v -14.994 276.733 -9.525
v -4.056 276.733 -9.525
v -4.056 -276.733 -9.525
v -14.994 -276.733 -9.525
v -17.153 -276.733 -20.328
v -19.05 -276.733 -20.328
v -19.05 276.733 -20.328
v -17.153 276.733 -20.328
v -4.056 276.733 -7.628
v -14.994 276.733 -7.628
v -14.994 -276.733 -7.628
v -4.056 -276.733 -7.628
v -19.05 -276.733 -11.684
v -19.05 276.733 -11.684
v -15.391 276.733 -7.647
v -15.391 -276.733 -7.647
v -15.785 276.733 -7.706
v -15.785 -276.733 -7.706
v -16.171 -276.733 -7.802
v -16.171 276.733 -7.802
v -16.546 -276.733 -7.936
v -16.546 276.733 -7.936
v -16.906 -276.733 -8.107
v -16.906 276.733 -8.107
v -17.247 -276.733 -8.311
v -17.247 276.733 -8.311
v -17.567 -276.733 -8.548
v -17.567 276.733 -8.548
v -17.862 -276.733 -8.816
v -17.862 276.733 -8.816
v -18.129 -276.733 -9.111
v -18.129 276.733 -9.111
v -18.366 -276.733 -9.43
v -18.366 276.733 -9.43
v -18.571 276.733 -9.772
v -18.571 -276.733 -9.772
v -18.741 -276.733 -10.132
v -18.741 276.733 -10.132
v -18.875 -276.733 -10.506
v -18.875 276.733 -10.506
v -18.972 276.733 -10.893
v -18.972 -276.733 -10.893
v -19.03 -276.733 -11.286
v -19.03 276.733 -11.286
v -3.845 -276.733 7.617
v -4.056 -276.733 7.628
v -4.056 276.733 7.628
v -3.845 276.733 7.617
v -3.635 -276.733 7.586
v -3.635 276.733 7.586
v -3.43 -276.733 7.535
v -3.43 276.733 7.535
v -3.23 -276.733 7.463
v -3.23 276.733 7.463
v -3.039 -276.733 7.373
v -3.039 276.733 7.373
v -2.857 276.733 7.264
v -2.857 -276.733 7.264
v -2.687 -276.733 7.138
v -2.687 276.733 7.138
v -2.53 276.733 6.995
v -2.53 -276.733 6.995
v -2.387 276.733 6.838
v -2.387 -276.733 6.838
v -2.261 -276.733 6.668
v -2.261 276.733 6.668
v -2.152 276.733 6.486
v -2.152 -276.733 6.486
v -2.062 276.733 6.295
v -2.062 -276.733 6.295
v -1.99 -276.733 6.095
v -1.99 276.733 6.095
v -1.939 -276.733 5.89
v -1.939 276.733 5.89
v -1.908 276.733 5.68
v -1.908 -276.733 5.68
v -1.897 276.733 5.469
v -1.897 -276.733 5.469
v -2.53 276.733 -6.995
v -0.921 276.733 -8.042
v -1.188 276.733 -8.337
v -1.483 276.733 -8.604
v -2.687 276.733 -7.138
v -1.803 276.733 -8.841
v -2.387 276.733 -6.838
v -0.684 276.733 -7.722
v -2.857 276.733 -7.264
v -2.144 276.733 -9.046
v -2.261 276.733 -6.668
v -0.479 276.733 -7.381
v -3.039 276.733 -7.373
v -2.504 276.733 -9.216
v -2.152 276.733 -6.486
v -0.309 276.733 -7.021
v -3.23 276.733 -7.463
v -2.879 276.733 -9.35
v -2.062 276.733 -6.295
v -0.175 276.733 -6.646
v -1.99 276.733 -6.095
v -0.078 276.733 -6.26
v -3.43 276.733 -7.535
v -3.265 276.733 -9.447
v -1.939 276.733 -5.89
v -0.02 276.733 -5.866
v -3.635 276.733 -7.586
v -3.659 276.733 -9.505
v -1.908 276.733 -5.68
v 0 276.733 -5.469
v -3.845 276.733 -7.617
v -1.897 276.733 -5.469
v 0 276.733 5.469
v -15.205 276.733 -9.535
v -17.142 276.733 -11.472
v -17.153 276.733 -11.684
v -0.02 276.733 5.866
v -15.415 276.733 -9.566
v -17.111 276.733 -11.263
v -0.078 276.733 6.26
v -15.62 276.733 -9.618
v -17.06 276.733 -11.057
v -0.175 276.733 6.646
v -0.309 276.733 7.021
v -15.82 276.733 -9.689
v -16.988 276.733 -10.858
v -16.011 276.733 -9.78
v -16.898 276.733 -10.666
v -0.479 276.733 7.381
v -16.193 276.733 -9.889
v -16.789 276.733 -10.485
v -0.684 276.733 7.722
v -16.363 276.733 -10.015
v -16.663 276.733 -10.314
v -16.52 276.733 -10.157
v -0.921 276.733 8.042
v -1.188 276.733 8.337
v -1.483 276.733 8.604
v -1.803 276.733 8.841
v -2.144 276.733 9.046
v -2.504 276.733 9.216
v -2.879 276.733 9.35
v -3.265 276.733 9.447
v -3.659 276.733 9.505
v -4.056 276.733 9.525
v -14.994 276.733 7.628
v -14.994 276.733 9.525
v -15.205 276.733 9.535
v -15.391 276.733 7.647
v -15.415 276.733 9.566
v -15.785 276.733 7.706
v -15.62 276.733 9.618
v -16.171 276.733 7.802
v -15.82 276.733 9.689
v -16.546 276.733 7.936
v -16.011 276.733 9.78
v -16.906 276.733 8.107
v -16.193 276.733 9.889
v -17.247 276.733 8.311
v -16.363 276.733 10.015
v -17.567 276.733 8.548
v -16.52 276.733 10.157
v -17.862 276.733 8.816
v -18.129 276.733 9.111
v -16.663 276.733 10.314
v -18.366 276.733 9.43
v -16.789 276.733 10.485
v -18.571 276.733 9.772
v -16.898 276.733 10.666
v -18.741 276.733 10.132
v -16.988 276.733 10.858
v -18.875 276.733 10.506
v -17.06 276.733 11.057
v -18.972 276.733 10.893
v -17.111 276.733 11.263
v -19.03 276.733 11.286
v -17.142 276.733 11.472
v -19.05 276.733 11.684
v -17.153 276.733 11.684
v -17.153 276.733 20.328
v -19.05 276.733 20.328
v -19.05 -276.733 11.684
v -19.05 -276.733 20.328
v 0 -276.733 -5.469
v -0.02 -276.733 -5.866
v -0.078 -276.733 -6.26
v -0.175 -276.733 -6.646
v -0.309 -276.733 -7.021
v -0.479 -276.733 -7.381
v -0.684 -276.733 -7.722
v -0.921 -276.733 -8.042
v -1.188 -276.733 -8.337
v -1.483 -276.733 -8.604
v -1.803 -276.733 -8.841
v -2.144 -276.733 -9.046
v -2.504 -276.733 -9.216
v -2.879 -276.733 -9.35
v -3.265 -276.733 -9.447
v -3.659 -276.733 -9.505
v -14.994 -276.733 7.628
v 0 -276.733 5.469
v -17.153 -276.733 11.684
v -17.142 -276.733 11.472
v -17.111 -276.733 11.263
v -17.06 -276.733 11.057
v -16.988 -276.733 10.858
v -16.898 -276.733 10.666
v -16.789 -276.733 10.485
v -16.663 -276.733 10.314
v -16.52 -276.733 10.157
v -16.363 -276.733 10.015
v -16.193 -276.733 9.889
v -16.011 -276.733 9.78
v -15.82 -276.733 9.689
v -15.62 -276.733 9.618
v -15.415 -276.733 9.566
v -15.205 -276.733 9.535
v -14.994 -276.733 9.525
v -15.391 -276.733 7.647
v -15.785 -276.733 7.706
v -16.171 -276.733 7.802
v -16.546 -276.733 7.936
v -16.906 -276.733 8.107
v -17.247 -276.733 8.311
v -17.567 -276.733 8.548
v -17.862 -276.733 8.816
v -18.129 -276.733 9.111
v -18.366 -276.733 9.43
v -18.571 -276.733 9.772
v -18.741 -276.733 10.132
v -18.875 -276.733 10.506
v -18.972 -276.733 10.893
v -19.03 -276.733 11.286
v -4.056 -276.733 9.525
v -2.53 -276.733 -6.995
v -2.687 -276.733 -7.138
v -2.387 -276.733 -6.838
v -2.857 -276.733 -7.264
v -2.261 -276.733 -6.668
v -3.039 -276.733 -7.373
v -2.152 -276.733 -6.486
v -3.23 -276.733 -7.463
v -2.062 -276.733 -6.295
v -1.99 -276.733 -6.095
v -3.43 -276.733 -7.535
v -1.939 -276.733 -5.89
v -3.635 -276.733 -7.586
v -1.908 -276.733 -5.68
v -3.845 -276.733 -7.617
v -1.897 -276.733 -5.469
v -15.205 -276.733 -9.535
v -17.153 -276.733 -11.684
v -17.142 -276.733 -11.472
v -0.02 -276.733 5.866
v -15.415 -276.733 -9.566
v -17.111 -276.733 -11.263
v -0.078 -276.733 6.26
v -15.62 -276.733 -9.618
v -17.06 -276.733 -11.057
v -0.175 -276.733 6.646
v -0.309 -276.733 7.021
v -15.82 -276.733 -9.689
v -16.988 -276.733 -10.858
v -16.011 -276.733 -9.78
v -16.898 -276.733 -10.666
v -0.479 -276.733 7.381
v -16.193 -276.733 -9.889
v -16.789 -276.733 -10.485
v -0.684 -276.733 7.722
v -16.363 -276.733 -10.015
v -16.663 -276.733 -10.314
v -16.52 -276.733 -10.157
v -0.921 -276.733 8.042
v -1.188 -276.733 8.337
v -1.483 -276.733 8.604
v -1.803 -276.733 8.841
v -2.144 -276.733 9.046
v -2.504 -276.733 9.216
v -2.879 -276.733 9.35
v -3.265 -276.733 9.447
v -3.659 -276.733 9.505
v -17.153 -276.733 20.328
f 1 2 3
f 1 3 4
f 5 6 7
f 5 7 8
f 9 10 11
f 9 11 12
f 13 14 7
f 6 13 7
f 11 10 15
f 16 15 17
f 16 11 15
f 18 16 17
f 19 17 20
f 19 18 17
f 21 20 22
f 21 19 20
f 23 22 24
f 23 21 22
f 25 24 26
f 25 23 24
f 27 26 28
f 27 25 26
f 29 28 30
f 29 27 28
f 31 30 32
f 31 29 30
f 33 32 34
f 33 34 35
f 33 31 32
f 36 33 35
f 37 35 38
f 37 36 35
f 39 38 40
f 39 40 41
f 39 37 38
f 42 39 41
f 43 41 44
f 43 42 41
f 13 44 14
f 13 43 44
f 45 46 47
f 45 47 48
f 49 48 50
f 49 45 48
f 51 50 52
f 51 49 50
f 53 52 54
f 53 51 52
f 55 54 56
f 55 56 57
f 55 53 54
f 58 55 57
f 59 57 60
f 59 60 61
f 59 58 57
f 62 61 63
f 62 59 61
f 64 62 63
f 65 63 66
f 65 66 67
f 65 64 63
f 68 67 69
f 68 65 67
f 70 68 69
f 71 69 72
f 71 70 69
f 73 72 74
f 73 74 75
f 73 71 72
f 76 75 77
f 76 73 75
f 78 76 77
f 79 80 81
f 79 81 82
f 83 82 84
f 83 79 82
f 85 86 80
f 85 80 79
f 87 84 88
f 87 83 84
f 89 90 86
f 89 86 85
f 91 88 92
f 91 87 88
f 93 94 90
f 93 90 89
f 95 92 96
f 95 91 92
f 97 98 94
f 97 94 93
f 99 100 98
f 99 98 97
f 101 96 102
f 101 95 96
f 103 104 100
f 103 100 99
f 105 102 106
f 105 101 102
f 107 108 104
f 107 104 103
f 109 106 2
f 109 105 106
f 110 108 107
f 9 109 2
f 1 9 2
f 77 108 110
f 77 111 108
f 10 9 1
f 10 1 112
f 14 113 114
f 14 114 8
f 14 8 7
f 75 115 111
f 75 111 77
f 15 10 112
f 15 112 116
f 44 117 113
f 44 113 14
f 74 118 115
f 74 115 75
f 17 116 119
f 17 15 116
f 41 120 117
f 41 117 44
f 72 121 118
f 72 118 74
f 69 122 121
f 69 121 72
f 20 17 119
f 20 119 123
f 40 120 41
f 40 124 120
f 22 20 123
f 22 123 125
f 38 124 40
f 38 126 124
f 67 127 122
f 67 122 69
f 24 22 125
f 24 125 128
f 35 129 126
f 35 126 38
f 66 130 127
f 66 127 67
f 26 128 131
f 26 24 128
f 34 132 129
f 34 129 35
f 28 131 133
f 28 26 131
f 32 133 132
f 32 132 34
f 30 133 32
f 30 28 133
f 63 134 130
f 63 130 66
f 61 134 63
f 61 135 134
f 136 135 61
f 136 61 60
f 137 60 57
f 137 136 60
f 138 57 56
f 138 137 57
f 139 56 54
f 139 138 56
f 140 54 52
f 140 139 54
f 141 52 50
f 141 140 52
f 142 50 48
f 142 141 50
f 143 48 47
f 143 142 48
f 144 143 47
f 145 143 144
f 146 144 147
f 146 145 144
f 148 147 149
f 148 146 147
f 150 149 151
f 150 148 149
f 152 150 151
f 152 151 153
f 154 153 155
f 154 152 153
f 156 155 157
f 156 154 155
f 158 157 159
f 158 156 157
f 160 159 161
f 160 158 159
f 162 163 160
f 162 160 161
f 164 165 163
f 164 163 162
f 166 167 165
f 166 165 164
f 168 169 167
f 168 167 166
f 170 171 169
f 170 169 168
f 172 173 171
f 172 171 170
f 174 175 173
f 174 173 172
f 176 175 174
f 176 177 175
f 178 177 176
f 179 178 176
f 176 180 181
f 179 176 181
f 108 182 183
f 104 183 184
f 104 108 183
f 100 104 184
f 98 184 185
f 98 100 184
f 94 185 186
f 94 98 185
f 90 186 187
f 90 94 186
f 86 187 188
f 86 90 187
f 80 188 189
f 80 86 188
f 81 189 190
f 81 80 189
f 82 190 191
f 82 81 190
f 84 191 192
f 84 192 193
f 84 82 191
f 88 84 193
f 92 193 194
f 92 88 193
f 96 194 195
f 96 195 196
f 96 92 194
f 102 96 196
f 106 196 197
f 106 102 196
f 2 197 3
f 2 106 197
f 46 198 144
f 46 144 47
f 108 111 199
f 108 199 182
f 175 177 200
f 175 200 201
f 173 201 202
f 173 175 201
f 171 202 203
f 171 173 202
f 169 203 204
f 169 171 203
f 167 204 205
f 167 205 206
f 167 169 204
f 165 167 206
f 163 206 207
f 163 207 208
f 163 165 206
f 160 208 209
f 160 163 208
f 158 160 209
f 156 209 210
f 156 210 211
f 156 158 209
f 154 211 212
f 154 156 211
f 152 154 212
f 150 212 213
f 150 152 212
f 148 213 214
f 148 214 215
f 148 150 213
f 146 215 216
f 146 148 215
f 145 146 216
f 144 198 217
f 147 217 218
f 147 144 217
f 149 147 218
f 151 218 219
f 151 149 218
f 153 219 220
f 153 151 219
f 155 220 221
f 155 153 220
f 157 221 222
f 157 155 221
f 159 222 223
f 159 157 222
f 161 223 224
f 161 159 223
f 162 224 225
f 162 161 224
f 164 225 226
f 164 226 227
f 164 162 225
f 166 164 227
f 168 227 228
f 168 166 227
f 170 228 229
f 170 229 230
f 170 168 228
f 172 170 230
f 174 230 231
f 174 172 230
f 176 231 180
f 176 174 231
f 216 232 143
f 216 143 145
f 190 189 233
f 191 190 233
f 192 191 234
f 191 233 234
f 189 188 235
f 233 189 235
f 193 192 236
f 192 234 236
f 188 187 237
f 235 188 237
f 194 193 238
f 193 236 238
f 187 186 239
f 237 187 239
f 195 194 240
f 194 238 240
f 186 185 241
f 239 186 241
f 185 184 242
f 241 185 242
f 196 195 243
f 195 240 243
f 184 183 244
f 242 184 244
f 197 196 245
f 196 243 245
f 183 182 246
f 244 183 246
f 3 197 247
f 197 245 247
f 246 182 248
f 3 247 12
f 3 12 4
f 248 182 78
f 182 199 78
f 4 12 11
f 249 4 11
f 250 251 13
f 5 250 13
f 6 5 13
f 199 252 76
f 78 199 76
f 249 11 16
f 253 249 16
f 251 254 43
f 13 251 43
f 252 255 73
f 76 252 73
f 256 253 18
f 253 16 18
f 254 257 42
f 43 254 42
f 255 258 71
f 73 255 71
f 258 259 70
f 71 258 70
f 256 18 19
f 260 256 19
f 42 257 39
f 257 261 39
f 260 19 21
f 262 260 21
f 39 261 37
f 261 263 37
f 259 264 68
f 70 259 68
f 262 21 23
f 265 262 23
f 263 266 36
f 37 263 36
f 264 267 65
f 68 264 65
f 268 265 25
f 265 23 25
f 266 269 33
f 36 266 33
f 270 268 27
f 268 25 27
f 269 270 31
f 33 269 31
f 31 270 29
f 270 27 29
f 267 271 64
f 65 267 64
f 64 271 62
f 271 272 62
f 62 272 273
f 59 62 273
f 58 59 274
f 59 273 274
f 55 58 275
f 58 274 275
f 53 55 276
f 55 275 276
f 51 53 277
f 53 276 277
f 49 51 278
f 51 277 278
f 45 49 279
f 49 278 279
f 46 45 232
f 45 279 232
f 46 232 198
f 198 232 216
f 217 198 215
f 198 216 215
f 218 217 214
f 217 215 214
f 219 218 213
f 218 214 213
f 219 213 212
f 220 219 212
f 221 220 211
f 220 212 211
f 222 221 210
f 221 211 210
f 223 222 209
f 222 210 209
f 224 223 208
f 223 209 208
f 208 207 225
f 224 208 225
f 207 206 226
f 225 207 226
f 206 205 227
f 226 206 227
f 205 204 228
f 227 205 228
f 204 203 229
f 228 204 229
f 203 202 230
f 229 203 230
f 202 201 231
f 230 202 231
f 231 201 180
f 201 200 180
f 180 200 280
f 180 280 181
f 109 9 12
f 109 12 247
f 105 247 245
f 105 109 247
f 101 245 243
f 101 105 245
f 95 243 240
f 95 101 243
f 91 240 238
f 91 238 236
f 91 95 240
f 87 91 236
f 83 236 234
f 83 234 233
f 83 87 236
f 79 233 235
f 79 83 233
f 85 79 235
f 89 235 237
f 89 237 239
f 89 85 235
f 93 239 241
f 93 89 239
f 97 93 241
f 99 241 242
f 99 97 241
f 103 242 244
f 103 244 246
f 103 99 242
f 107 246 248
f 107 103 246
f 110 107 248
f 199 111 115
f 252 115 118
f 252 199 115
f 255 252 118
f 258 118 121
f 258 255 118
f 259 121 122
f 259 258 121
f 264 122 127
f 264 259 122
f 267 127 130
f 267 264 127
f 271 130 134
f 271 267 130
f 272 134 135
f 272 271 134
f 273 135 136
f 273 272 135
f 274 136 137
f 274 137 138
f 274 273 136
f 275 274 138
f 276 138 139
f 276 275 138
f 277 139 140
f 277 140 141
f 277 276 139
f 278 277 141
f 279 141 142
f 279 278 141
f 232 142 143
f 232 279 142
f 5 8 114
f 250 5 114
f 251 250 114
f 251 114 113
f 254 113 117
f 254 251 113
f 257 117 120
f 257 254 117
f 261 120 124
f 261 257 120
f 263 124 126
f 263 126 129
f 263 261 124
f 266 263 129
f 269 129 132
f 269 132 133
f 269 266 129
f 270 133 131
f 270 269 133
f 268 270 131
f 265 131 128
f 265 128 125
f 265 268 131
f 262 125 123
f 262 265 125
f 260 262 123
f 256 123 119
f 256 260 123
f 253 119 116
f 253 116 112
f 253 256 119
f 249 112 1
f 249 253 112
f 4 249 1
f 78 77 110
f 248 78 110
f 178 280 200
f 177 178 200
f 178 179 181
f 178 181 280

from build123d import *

# Parameters (mm, degrees)
SKETCH2_W                      = 19.05
SKETCH2_H                      = 553.466
BASE_FLANGE1_DEPTH             = 1.89738
EDGE_FLANGE1_STRIP_W           = 11.90752
EDGE_FLANGE1_STRIP_H           = 1.89738
EDGE_FLANGE1_STRIP_CUT_DEPTH   = 553.466
EDGE_FLANGE1_STRIP_2_W         = 11.90752
EDGE_FLANGE1_STRIP_2_H         = 1.89738
EDGE_FLANGE1_STRIP_CUT_2_DEPTH = 553.466
EDGE_FLANGE1_DEPTH             = 553.466
EDGE_FLANGE1_BEND_DEPTH        = 553.466
EDGE_FLANGE2_STRIP_W           = 11.90752
EDGE_FLANGE2_STRIP_H           = 1.89738
EDGE_FLANGE2_STRIP_CUT_DEPTH   = 553.466
EDGE_FLANGE2_STRIP_2_W         = 11.90752
EDGE_FLANGE2_STRIP_2_H         = 1.89738
EDGE_FLANGE2_STRIP_CUT_2_DEPTH = 553.466
EDGE_FLANGE2_DEPTH             = 553.466
EDGE_FLANGE2_BEND_DEPTH        = 553.466


# Sheet-metal steps are written as plain solids
with BuildPart() as part:
    # Sketch2 → Base-Flange1 (new body)
    with BuildSketch(Plane(origin=(0, 0, 0), x_dir=(0, 0, -1), z_dir=(1, 0, 0))):
        Rectangle(SKETCH2_W, SKETCH2_H)
    extrude(amount=-BASE_FLANGE1_DEPTH)

    # Edge-Flange1 strip (across the edge) → Edge-Flange1 strip cut (cut)
    with BuildSketch(Plane(origin=(-1.89738, -276.733, 9.525), x_dir=(0, 0, -1), z_dir=(0, 1, 0))):
        with Locations((-1.89738, -0.94869)):
            Rectangle(EDGE_FLANGE1_STRIP_W, EDGE_FLANGE1_STRIP_H)
    extrude(amount=EDGE_FLANGE1_STRIP_CUT_DEPTH, mode=Mode.SUBTRACT)

    # Edge-Flange1 strip 2 (across the edge) → Edge-Flange1 strip cut 2 (cut)
    with BuildSketch(Plane(origin=(-1.89738, 276.733, -9.525), x_dir=(0, 0, 1), z_dir=(0, -1, 0))):
        with Locations((-1.89738, -0.94869)):
            Rectangle(EDGE_FLANGE1_STRIP_2_W, EDGE_FLANGE1_STRIP_2_H)
    extrude(amount=EDGE_FLANGE1_STRIP_CUT_2_DEPTH, mode=Mode.SUBTRACT)

    # Edge-Flange1 section (across the edge) → Edge-Flange1 (add)
    with BuildSketch(Plane(origin=(-1.89738, -276.733, 9.525), x_dir=(0, 0, -1), z_dir=(0, 1, 0))):
        with BuildLine():
            Line((0, 2.159), (0, 17.15262))
            Line((0, 17.15262), (1.89738, 17.15262))
            Line((1.89738, 17.15262), (1.89738, 2.159))
            ThreePointArc((1.89738, 2.159), (2.529736459, 0.632356459), (4.05638, 0))
            Line((4.05638, 0), (4.05638, -1.89738))
            ThreePointArc((4.05638, -1.89738), (1.188086195, -0.709293805), (0, 2.159))
        make_face()
    extrude(amount=EDGE_FLANGE1_DEPTH)

    # Edge-Flange1 section 2 (across the edge) → Edge-Flange1 bend (add)
    with BuildSketch(Plane(origin=(-1.89738, 276.733, -9.525), x_dir=(0, 0, 1), z_dir=(0, -1, 0))):
        with BuildLine():
            Line((0, 2.159), (0, 17.15262))
            Line((0, 17.15262), (1.89738, 17.15262))
            Line((1.89738, 17.15262), (1.89738, 2.159))
            ThreePointArc((1.89738, 2.159), (2.529736459, 0.632356459), (4.05638, 0))
            Line((4.05638, 0), (4.05638, -1.89738))
            ThreePointArc((4.05638, -1.89738), (1.188086195, -0.709293805), (0, 2.159))
        make_face()
    extrude(amount=EDGE_FLANGE1_BEND_DEPTH)

    # Edge-Flange2 strip (across the edge) → Edge-Flange2 strip cut (cut)
    with BuildSketch(Plane(origin=(-19.05, -276.733, -9.525), x_dir=(1, 0, 0), z_dir=(0, 1, 0))):
        with Locations((-1.89738, -0.94869)):
            Rectangle(EDGE_FLANGE2_STRIP_W, EDGE_FLANGE2_STRIP_H)
    extrude(amount=EDGE_FLANGE2_STRIP_CUT_DEPTH, mode=Mode.SUBTRACT)

    # Edge-Flange2 strip 2 (across the edge) → Edge-Flange2 strip cut 2 (cut)
    with BuildSketch(Plane(origin=(-19.05, 276.733, 9.525), x_dir=(1, 0, 0), z_dir=(0, -1, 0))):
        with Locations((-1.89738, -0.94869)):
            Rectangle(EDGE_FLANGE2_STRIP_2_W, EDGE_FLANGE2_STRIP_2_H)
    extrude(amount=EDGE_FLANGE2_STRIP_CUT_2_DEPTH, mode=Mode.SUBTRACT)

    # Edge-Flange2 section (across the edge) → Edge-Flange2 (add)
    with BuildSketch(Plane(origin=(-19.05, -276.733, -9.525), x_dir=(1, 0, 0), z_dir=(0, 1, 0))):
        with BuildLine():
            Line((0, 2.159), (0, 10.80262))
            Line((0, 10.80262), (1.89738, 10.80262))
            Line((1.89738, 10.80262), (1.89738, 2.159))
            ThreePointArc((1.89738, 2.159), (2.529736459, 0.632356459), (4.05638, 0))
            Line((4.05638, 0), (4.05638, -1.89738))
            ThreePointArc((4.05638, -1.89738), (1.188086195, -0.709293805), (0, 2.159))
        make_face()
    extrude(amount=EDGE_FLANGE2_DEPTH)

    # Edge-Flange2 section 2 (across the edge) → Edge-Flange2 bend (add)
    with BuildSketch(Plane(origin=(-19.05, 276.733, 9.525), x_dir=(1, 0, 0), z_dir=(0, -1, 0))):
        with BuildLine():
            Line((0, 2.159), (0, 10.80262))
            Line((0, 10.80262), (1.89738, 10.80262))
            Line((1.89738, 10.80262), (1.89738, 2.159))
            ThreePointArc((1.89738, 2.159), (2.529736459, 0.632356459), (4.05638, 0))
            Line((4.05638, 0), (4.05638, -1.89738))
            ThreePointArc((4.05638, -1.89738), (1.188086195, -0.709293805), (0, 2.159))
        make_face()
    extrude(amount=EDGE_FLANGE2_BEND_DEPTH)


solid = part.part
